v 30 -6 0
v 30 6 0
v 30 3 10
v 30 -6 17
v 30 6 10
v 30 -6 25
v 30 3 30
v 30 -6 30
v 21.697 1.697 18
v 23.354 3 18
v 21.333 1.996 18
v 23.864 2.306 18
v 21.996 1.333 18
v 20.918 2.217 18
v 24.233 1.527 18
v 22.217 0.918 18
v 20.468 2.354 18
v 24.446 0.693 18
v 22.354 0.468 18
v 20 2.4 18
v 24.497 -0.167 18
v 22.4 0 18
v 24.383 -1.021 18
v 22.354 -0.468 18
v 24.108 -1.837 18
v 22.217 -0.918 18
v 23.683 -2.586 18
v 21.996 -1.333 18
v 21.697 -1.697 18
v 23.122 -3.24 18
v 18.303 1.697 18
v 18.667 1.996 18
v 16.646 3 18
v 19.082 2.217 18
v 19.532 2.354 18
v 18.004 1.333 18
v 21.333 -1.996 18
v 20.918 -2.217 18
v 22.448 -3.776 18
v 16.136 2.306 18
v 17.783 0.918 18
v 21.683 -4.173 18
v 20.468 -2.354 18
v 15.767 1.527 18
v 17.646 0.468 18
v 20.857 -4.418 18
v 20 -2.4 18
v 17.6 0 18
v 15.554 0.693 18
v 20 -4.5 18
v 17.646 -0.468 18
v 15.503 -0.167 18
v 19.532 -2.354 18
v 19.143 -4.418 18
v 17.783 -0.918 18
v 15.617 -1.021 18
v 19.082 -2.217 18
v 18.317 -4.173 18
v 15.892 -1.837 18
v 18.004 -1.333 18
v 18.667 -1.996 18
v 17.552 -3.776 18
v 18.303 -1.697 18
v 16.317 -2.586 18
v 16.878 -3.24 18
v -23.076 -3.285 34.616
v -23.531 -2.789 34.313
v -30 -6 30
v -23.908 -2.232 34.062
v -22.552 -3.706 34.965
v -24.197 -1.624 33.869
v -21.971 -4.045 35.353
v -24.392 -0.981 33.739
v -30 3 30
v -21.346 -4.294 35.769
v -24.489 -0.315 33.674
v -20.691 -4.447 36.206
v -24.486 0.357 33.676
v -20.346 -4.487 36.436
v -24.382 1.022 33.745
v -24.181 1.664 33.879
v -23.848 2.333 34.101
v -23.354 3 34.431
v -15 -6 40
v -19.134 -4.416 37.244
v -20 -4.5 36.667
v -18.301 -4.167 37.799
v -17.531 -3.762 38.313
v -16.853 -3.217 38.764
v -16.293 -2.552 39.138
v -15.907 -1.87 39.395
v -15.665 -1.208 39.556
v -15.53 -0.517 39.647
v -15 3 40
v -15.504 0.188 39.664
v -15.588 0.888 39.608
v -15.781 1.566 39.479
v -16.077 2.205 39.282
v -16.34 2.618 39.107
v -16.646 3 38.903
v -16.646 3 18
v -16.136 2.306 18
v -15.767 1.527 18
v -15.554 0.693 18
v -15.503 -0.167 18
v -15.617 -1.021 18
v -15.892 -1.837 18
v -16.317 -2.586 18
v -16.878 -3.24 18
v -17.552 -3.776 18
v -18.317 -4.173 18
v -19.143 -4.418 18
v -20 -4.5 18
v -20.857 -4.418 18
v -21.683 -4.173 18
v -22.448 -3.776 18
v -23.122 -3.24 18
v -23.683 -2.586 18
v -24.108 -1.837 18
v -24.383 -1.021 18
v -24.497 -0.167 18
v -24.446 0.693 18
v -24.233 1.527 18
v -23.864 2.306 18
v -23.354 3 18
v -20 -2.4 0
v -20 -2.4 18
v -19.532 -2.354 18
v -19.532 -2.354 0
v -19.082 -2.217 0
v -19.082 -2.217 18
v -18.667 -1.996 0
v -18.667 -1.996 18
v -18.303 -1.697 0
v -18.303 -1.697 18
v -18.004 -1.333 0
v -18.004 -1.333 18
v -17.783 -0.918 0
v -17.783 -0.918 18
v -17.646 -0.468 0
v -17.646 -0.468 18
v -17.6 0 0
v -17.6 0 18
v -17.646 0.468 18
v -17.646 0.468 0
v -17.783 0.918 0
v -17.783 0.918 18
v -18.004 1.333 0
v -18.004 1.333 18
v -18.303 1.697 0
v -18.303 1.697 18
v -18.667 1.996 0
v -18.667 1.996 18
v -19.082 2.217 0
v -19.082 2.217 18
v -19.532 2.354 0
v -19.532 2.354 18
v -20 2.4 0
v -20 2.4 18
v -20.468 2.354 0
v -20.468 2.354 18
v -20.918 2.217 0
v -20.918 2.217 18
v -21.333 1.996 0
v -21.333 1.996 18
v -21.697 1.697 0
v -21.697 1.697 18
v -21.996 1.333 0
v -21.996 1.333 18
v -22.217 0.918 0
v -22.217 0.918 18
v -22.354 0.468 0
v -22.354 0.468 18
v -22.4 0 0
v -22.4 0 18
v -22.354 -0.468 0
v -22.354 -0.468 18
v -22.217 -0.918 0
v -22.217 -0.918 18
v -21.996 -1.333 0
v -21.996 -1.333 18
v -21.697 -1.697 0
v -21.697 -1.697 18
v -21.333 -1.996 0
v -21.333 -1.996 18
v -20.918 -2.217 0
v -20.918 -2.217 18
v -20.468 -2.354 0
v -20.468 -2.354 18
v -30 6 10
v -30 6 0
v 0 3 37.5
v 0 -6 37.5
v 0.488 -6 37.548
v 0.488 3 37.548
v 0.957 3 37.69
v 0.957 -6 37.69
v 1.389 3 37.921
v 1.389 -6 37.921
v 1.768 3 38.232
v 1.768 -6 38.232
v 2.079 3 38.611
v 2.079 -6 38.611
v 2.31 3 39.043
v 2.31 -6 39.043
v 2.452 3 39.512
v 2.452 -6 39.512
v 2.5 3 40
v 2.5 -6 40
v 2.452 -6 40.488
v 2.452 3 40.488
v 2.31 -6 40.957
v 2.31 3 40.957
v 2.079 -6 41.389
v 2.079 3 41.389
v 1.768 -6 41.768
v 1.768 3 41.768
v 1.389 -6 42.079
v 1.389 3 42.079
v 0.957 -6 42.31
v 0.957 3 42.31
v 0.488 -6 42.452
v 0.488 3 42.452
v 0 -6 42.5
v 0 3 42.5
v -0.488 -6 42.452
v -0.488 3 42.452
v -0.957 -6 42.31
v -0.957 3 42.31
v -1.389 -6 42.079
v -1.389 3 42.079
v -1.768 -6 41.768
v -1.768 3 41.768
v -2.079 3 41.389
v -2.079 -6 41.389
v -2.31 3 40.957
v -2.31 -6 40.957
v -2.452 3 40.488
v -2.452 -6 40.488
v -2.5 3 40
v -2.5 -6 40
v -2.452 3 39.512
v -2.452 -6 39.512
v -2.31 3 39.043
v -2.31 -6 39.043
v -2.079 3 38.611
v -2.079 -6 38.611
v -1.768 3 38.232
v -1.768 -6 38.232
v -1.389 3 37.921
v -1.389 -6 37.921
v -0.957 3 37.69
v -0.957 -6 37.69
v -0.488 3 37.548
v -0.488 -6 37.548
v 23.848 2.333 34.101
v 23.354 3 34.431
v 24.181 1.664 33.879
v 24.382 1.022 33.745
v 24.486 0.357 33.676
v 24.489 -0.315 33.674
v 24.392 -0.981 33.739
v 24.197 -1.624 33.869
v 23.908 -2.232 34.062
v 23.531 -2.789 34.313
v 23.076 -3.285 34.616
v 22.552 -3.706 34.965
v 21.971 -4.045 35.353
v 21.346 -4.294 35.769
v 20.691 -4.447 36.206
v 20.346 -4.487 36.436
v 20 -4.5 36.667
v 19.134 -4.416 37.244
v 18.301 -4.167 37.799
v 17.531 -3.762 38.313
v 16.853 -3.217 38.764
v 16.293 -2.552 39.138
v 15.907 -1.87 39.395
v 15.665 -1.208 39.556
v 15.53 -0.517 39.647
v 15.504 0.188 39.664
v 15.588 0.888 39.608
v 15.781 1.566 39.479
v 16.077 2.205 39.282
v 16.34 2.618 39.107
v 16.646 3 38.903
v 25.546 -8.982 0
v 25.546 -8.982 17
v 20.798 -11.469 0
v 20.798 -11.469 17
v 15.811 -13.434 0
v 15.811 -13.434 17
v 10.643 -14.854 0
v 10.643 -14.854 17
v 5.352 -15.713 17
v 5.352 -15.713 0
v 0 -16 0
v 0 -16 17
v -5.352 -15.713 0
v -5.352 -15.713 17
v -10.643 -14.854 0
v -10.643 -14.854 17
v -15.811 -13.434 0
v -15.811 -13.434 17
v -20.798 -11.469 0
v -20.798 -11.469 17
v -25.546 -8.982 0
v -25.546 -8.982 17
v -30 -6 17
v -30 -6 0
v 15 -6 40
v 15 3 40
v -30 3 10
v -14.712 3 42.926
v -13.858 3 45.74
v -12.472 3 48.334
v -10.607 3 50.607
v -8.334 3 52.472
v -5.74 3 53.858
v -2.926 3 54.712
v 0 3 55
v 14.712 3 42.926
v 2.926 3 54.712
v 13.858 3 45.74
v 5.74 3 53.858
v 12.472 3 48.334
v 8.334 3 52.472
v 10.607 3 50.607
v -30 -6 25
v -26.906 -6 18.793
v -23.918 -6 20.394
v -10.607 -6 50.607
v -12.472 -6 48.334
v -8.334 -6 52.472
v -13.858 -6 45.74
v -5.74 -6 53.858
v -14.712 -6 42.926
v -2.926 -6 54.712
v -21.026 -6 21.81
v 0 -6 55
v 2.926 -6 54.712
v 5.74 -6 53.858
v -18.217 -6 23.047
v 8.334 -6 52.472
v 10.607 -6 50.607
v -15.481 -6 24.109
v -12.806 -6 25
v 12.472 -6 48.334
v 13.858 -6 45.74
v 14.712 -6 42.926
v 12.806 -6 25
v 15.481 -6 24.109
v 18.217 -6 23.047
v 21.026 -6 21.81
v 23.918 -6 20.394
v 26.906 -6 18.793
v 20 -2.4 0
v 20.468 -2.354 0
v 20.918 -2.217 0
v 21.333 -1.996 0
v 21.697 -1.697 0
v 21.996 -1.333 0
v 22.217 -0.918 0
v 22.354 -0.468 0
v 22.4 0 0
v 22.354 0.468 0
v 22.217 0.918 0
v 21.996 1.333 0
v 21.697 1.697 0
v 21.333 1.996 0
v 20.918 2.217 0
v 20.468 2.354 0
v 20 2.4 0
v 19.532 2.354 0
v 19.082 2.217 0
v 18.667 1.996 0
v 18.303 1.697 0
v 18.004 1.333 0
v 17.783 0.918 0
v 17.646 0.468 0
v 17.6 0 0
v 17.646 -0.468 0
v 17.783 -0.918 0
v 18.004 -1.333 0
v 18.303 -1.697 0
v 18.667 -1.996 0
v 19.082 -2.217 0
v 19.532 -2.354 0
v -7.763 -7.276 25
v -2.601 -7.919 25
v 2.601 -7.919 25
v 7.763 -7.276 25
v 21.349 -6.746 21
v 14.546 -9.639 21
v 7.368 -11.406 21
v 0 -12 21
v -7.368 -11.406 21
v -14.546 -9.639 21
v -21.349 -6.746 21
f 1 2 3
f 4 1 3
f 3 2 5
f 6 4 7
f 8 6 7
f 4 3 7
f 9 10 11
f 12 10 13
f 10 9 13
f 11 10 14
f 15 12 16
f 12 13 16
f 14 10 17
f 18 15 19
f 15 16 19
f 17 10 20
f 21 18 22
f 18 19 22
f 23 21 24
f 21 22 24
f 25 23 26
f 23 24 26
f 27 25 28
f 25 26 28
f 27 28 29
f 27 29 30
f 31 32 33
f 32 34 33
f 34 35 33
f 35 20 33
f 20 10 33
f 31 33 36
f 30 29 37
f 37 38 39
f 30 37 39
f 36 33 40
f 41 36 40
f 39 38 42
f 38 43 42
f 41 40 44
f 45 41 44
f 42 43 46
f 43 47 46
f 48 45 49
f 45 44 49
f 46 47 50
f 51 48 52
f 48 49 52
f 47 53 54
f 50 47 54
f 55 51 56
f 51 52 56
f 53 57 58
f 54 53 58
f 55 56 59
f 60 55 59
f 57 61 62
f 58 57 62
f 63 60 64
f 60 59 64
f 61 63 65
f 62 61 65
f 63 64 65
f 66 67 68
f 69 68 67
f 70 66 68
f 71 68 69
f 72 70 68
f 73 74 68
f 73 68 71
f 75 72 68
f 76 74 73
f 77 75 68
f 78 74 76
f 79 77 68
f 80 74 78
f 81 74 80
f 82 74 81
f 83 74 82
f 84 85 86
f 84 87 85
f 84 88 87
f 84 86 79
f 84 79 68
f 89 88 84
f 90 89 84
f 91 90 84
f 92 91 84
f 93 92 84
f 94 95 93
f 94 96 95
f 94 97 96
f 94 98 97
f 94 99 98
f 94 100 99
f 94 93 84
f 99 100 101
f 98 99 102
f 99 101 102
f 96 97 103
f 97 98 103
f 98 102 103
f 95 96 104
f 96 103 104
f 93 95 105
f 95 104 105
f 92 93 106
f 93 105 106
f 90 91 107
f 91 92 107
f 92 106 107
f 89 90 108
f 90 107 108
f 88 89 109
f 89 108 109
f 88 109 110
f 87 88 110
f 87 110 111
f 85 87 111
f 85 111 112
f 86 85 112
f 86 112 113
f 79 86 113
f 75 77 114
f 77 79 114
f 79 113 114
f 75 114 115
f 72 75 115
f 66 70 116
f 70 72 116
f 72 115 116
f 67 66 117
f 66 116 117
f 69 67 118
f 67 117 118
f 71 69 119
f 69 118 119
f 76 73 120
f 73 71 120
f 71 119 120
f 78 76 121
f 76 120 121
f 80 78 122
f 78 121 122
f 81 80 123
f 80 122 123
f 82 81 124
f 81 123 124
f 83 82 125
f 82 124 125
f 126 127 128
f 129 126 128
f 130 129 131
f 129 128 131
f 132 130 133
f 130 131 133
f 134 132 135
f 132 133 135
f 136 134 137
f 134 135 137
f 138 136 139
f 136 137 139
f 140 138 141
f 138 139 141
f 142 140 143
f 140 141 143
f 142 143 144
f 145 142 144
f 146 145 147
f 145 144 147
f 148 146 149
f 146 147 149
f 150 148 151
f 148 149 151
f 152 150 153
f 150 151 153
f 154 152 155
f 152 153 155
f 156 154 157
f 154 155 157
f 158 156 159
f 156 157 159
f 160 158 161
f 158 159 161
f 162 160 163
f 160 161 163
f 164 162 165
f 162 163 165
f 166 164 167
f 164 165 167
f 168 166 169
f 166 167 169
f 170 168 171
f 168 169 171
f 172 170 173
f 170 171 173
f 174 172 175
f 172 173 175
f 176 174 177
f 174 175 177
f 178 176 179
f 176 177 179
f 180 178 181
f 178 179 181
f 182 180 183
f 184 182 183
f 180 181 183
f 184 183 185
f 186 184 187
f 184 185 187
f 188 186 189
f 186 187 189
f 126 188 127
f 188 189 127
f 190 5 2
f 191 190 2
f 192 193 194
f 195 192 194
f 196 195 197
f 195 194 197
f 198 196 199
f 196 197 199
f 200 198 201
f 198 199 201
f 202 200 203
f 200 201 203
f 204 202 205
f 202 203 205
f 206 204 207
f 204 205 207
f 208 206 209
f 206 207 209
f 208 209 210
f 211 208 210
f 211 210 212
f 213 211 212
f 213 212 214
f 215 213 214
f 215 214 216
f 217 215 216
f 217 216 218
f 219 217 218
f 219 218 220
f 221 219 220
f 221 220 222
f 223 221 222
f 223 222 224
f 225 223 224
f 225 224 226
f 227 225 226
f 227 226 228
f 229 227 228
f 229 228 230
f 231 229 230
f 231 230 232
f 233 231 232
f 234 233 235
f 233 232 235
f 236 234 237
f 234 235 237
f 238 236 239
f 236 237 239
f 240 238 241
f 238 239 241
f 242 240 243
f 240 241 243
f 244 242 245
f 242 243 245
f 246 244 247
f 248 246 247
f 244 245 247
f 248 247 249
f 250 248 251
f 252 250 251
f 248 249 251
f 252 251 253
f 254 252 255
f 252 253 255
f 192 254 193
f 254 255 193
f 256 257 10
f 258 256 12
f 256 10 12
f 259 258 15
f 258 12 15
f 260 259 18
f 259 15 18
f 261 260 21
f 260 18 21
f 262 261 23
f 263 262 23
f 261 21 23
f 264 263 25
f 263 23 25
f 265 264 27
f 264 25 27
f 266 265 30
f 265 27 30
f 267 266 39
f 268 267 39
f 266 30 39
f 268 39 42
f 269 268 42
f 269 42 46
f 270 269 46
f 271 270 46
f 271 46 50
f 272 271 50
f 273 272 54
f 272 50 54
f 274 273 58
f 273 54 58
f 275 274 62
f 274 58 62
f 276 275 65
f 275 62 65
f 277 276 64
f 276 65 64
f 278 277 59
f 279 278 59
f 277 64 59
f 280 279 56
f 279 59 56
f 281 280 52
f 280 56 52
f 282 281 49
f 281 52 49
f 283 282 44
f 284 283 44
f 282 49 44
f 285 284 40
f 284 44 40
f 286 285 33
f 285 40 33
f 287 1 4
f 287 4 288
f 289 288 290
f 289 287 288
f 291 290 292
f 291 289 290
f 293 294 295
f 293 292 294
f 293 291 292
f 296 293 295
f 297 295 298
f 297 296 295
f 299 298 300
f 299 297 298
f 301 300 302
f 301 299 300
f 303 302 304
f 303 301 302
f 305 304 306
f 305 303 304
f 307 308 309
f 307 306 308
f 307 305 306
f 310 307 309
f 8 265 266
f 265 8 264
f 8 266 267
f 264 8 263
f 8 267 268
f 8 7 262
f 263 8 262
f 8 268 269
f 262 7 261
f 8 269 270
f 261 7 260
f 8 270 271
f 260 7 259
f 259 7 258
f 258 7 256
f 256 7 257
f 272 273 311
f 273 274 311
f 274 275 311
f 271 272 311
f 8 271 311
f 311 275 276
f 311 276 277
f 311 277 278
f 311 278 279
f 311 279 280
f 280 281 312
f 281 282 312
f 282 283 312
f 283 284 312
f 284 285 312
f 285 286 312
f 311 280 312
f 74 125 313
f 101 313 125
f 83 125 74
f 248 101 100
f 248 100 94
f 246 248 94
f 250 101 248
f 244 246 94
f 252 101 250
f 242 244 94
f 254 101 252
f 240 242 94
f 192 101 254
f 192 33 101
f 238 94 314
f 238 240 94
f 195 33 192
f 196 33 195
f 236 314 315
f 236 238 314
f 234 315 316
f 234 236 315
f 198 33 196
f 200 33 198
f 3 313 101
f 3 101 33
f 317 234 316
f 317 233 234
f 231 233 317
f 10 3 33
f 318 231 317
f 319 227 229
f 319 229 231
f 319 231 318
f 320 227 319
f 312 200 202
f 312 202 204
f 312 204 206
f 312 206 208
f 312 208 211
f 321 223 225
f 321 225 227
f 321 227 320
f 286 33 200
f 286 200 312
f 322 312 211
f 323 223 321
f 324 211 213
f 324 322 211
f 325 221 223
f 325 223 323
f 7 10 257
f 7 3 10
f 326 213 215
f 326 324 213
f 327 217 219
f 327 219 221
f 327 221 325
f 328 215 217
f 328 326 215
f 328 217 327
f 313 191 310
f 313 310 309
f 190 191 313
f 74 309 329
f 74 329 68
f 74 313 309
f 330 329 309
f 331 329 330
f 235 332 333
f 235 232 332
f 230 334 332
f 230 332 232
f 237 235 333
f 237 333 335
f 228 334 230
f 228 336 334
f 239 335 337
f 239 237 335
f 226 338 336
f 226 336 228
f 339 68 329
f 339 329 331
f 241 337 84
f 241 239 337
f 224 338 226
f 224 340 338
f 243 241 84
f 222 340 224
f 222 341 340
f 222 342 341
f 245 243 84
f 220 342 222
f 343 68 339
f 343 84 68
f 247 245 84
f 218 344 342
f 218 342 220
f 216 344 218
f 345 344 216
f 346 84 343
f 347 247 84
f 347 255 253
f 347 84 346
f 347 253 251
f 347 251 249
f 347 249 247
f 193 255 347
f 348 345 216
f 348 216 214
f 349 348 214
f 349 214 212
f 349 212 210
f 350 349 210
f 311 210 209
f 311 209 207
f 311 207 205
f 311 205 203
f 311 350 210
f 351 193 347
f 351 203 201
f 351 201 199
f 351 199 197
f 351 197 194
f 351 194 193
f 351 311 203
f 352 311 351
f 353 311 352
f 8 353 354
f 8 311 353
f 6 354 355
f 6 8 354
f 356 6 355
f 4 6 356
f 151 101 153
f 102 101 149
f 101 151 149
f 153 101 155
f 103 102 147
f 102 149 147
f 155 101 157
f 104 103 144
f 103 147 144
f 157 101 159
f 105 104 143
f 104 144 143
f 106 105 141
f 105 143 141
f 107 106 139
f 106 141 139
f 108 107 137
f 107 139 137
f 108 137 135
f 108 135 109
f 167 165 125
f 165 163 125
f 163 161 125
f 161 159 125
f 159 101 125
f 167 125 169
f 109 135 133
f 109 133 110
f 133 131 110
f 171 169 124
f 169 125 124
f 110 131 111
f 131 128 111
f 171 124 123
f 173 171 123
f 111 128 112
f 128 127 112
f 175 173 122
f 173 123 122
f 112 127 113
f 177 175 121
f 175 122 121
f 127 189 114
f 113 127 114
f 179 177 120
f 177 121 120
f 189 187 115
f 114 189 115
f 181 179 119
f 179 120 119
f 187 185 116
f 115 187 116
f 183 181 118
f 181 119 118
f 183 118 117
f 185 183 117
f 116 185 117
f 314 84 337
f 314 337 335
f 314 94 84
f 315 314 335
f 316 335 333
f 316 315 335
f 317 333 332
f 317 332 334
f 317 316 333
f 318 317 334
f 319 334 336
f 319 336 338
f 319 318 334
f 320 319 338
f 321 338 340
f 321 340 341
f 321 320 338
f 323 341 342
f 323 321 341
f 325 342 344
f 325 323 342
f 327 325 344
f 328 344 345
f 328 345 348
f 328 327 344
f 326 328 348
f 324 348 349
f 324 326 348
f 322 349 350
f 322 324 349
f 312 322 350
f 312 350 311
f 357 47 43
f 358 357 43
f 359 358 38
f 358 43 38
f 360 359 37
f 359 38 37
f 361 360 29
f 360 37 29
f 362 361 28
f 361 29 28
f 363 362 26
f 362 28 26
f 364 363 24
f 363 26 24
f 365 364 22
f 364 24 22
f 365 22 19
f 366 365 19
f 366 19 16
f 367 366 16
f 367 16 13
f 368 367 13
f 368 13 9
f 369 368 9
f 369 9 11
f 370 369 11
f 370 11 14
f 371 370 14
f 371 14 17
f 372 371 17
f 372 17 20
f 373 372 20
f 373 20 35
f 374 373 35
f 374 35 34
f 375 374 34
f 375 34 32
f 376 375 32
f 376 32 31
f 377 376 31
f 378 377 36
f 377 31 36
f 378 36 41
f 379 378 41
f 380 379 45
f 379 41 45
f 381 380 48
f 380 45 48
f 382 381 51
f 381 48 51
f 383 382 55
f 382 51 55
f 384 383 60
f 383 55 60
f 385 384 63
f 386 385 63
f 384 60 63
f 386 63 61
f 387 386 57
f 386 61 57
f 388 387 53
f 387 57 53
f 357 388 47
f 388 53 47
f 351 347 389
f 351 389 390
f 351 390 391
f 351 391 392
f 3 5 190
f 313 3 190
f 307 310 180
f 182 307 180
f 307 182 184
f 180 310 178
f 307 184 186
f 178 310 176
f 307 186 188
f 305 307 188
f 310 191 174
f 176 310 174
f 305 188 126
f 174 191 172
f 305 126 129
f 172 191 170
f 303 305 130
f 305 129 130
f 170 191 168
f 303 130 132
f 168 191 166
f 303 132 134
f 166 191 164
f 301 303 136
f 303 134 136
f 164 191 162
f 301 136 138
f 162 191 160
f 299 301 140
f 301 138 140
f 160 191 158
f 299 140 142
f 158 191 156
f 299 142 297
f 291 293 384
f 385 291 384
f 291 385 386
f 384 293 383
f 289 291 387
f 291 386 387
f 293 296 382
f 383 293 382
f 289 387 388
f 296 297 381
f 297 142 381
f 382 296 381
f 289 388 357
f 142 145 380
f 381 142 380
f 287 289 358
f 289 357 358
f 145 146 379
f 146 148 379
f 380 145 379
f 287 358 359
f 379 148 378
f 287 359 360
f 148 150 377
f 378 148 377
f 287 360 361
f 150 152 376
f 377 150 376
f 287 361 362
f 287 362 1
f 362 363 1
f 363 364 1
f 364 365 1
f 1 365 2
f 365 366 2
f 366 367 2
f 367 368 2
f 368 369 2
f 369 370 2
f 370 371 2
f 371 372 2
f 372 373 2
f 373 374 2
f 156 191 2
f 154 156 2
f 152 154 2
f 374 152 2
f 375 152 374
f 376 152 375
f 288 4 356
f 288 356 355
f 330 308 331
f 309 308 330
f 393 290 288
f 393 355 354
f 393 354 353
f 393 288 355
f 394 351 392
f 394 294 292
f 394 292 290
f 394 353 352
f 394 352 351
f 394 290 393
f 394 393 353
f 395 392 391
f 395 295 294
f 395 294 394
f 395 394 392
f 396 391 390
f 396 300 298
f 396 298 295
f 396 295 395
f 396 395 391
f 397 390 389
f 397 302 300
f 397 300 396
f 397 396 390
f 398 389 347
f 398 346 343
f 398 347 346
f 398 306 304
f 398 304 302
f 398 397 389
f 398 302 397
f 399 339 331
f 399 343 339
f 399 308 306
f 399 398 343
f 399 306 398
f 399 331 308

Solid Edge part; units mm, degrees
sketch "Sketch1" plane through (0, 0, 0) normal (0, -1, 0) x (1, 0, 0)
  line L0 (-30, 0) -> (30, 0)
  line L1 (30, 0) -> (30, 30)
  line L2 (30, 30) -> (15, 40)
  arc A0 (-15, 40) -> (15, 40) centre (0, 40) cw
  line L3 (-30, 30) -> (-15, 40)
  line L4 (-30, 0) -> (-30, 30)
  dimension "D1" = 60
  dimension "D2" = 30
  dimension "D3" = 15
  dimension "D4" = 40
extrude "Protrusion1" add sketch "Sketch1" along normal mid plane 12
hole "Hole_1" at (0, -6, 40) direction (0, 1, 0) diameter 5 end up to next
hole "Hole_2" at (-20, 0, 40) direction (0, 0, -1) diameter 4.8 end up to next counterbore diameter 9 counterbore depth 22
hole "Hole1" at (20, 0, 40) direction (0, 0, -1) diameter 4.8 end up to next counterbore diameter 9 counterbore depth 22
sketch "Sketch2" plane through (0, 6, 20) normal (0, 1, 0) x (-1, 0, 0)
  line L0 (-30, -10) -> (30, -10)
  dimension "D1" = 10
extrude "ExtrudedCutout_1" cut sketch "Sketch2" against normal blind 3 material side at (0, 6, 10.05)
sketch "Sketch3" plane through (0, 0, 0) normal (0, 0, -1) x (1, 0, 0)
  arc A0 (-30, 6) -> (30, 6) centre (0, -34) cw
  line L0 (-30, 6) -> (30, 6)
  dimension "D1" = 50
extrude "ExtrudedProtrusion_2" add sketch "Sketch3" against normal blind 25
chamfer "Chamfer_1" distance 8 angle 45 1 edges at (0, -16, 25)
properties material "Polyethylene, low density"
